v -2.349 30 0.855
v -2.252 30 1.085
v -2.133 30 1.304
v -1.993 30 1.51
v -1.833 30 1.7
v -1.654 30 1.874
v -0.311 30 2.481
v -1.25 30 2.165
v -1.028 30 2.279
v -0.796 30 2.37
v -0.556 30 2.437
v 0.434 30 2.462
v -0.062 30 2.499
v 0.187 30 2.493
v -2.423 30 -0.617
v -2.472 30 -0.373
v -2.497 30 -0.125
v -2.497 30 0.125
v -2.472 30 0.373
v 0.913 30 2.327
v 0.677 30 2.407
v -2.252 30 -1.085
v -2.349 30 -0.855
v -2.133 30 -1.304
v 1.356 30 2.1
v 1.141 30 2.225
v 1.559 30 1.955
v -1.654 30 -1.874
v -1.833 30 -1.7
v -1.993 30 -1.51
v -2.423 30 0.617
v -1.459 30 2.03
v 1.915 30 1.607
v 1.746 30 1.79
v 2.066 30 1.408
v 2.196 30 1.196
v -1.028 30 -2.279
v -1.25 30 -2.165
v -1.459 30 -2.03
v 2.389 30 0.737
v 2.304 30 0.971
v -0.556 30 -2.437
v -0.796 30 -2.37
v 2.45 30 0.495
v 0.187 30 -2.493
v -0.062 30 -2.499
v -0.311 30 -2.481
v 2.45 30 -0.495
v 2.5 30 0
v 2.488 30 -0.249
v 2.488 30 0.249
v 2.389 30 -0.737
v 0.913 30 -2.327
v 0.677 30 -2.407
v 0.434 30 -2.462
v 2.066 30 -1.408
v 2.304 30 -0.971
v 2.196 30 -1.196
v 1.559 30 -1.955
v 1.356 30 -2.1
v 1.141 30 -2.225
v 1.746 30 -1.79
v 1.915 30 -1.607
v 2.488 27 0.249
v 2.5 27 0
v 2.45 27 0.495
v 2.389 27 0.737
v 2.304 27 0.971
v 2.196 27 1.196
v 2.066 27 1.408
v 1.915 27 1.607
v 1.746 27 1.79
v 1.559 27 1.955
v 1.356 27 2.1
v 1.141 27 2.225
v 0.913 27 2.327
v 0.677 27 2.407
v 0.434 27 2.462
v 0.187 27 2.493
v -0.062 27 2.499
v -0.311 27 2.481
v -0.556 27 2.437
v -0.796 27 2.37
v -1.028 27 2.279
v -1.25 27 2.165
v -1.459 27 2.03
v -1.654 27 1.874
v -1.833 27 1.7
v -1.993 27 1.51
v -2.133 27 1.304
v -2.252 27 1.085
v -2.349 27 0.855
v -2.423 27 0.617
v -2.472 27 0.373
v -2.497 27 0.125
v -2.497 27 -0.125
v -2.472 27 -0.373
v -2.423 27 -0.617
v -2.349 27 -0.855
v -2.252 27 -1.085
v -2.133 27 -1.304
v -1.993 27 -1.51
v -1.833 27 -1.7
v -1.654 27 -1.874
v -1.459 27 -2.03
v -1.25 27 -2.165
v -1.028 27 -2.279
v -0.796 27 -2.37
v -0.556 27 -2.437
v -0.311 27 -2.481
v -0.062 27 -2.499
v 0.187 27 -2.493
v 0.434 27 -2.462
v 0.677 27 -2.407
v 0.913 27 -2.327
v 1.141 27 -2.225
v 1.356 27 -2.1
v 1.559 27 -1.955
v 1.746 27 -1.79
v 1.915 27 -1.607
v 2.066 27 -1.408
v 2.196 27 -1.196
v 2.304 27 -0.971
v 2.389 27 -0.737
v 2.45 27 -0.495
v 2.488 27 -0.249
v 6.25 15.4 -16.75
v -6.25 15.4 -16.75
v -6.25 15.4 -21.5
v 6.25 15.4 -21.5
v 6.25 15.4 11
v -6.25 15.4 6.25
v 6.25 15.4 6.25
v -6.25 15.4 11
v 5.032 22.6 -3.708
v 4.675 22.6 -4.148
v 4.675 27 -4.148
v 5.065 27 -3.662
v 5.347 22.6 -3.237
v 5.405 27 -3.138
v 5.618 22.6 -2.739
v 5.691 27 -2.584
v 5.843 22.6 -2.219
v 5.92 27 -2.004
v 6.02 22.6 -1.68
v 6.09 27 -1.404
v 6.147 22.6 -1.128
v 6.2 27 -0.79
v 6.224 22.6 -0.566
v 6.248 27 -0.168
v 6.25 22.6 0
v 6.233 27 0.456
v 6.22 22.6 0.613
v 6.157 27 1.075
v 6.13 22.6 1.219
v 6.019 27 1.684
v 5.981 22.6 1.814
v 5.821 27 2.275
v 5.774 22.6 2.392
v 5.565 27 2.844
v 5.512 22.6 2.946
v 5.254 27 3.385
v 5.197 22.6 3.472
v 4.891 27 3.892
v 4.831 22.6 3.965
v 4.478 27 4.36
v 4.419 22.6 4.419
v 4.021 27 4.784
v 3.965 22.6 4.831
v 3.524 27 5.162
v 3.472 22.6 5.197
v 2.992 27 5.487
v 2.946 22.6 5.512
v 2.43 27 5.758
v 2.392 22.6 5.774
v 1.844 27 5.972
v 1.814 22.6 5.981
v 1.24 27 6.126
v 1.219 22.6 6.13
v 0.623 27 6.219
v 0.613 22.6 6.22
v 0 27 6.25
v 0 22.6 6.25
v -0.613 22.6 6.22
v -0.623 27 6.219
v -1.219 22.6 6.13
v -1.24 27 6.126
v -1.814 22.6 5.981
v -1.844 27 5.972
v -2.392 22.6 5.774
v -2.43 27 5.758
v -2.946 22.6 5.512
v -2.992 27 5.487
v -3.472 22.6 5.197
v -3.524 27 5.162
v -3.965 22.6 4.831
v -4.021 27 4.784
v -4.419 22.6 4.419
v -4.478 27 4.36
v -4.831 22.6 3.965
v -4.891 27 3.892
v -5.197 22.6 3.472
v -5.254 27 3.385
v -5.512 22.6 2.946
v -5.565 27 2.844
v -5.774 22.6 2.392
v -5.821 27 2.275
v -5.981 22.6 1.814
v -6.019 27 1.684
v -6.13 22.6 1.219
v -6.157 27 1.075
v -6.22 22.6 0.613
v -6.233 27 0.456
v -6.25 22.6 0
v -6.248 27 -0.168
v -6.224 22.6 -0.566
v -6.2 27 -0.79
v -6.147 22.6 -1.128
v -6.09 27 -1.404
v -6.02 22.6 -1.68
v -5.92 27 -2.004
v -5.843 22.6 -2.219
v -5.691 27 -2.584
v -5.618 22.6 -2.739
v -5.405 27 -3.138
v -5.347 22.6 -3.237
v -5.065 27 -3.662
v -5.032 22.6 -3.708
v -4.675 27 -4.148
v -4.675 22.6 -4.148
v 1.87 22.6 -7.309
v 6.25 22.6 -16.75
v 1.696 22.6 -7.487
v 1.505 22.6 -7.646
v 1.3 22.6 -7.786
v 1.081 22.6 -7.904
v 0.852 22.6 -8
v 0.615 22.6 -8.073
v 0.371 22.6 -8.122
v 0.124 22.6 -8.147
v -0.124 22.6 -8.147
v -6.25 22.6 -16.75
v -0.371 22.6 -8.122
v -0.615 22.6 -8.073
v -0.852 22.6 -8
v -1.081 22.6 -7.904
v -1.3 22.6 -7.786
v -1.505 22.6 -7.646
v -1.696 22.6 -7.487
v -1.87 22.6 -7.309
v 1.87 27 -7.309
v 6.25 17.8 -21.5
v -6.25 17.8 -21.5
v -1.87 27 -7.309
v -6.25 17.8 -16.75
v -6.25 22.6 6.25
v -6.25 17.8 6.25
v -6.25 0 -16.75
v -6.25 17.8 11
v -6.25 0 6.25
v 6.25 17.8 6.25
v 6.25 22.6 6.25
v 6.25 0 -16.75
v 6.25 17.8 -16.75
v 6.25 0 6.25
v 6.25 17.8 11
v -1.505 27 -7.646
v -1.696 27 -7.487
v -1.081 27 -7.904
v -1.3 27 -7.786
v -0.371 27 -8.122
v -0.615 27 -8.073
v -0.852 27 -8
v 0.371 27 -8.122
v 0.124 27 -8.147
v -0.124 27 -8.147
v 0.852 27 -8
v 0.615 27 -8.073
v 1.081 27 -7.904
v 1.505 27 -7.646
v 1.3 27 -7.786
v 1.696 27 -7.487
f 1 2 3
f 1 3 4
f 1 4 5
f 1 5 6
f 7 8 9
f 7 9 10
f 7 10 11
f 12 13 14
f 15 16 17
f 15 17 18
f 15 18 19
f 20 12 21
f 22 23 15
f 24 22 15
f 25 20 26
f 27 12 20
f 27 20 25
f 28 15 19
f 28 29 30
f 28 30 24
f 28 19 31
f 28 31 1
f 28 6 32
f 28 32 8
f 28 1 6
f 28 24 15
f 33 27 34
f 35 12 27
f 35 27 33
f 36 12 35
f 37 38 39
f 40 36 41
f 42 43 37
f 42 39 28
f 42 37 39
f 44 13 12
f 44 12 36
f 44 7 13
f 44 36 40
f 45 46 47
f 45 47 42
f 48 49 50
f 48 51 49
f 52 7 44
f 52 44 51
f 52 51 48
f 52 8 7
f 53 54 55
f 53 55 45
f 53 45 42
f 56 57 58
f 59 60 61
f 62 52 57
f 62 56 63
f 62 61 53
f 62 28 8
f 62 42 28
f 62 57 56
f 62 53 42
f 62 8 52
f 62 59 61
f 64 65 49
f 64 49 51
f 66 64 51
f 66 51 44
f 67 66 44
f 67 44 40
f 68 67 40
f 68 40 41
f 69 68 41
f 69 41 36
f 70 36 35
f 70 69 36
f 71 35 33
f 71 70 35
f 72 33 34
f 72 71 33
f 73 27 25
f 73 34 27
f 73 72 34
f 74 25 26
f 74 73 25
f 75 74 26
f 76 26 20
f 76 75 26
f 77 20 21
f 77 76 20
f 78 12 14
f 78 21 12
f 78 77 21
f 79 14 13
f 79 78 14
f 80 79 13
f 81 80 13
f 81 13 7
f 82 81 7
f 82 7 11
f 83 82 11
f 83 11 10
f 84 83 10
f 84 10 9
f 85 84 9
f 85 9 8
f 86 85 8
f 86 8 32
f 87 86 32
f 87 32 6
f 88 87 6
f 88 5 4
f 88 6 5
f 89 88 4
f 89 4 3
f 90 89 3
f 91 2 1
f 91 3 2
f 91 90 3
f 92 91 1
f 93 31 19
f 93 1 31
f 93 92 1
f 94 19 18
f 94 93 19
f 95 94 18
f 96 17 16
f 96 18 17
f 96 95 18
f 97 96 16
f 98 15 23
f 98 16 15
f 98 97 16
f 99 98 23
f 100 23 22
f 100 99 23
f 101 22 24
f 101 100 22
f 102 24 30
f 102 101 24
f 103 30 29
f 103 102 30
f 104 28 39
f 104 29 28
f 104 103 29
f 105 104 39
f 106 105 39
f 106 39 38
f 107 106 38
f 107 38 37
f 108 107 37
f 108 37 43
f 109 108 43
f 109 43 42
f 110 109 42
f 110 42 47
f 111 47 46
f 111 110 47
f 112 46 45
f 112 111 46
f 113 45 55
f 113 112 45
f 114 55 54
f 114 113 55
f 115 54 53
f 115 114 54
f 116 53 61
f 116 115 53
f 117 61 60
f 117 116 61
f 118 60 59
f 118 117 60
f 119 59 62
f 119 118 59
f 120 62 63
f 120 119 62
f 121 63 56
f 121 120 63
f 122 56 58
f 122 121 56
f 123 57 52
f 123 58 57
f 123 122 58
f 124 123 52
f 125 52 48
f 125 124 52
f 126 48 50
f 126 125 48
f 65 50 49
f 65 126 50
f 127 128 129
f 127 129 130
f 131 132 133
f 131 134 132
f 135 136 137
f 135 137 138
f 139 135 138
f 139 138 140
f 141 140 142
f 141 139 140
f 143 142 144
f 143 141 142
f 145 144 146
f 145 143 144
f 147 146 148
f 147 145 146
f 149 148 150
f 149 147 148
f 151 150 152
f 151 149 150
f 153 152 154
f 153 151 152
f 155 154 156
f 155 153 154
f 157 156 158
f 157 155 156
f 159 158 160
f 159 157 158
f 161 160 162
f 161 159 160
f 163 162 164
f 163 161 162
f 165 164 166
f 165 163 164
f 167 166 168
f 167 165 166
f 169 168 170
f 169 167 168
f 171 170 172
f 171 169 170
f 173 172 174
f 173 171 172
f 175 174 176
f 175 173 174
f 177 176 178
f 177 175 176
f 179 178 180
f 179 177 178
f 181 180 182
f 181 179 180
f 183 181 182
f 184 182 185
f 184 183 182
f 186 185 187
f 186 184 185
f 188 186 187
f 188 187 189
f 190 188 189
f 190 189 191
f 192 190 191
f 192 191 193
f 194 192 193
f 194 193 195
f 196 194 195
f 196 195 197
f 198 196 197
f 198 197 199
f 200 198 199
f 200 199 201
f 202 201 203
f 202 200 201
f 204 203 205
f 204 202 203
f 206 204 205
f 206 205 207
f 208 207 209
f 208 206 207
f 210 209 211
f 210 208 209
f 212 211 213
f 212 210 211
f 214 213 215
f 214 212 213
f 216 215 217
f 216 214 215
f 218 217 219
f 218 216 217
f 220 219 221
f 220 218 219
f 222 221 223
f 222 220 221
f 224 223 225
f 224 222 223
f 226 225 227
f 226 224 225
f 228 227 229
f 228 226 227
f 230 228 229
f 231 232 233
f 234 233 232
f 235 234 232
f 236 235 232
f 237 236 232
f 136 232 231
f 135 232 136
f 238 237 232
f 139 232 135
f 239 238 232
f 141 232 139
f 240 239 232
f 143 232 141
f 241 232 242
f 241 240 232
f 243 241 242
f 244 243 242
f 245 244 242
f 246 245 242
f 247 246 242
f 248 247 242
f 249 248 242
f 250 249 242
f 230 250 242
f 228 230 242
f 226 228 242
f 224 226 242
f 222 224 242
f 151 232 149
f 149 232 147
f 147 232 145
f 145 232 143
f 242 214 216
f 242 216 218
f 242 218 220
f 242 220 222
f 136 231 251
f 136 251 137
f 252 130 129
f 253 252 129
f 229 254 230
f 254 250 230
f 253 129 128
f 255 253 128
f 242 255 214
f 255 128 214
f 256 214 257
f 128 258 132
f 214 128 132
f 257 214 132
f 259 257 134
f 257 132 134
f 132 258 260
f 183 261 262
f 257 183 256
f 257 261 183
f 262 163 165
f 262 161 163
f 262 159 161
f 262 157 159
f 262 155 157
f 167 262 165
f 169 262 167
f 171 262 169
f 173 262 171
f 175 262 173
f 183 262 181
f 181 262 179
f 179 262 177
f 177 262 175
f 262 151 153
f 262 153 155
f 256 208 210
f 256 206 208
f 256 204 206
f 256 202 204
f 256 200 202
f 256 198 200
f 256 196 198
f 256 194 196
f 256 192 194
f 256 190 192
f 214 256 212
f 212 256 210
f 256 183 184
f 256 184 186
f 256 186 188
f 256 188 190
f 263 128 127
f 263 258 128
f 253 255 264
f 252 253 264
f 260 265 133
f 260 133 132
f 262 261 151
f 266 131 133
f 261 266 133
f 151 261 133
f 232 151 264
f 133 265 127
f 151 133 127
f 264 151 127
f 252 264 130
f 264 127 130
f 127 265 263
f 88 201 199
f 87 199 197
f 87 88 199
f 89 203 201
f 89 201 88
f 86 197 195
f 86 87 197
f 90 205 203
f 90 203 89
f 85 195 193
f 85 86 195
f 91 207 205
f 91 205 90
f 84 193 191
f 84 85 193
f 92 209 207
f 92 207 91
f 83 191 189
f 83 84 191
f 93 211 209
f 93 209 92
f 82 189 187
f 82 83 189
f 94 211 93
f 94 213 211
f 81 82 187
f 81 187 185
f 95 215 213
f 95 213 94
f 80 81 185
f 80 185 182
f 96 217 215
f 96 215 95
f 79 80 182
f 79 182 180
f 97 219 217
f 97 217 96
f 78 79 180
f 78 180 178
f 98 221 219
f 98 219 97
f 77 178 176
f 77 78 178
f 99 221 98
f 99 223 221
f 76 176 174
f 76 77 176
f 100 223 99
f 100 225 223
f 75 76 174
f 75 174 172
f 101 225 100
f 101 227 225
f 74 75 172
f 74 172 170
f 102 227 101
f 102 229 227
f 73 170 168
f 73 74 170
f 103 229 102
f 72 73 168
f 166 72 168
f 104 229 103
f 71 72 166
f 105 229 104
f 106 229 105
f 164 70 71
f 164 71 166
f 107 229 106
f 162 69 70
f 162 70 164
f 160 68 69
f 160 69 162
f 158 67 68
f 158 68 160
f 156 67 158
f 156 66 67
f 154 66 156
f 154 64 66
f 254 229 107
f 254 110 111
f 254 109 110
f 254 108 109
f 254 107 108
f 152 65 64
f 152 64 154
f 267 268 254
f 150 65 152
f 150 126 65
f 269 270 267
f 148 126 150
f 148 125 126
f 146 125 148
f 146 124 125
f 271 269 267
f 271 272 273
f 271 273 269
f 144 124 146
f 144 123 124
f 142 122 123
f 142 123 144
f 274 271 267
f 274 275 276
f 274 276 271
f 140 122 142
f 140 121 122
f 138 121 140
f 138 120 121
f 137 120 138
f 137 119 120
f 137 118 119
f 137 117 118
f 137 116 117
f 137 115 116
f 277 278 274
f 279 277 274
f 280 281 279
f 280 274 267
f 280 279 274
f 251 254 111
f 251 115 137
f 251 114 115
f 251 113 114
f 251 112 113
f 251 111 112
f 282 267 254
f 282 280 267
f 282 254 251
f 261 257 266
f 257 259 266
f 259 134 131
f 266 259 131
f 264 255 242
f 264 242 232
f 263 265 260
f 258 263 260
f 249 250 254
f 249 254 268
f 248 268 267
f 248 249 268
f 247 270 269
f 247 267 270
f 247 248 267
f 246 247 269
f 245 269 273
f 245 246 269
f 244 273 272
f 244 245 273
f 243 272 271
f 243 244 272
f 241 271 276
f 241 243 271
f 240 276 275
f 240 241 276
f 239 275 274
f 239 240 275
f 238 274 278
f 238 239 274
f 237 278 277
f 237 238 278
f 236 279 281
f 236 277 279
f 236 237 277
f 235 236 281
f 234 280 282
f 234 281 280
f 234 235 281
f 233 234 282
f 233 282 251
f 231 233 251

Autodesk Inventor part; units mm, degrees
ref_plane "YZ Plane" through (0, 0, 0) normal (1, 0, 0) x (0, 1, 0)
ref_plane "XZ Plane" through (0, 0, 0) normal (0, 1, 0) x (-1, 0, 0)
sketch "スケッチ1" plane through (0, 0, 0) normal (0, 1, 0) x (-1, 0, 0)
  line L0 (6.25, -16.75) -> (-6.25, -16.75)
  line L1 (-6.25, -16.75) -> (-6.25, 6.25)
  line L2 (-6.25, 6.25) -> (6.25, 6.25)
  line L3 (6.25, 6.25) -> (6.25, -16.75)
  line L4 (6.25, -16.75) -> (-6.25, 6.25) construction
  line L5 (-6.25, -16.75) -> (6.25, 6.25) construction
  point P0 (0, 0)
  point P1 (0, -5.25)
  dimension "d0" = 12.5
  dimension "d1" = 23
  dimension "d2" = 6.25
extrude "押し出し1" add sketch "スケッチ1" along normal blind 22.6
sketch "スケッチ2" plane through (0, 22.6, 0) normal (0, 1, 0) x (1, 0, 0)
  circle A0 centre (0, 0) radius 6.25
  line L0 (-6.25, -6.25) -> (6.25, -6.25) projected
  line L1 (6.25, -6.25) -> (6.25, 16.75) projected
  line L2 (-6.25, 16.75) -> (-6.25, -6.25) projected
  circle A1 centre (0, 5.65) radius 2.5
  line L3 (-1.87, 7.3093) -> (-4.6749, 4.1482)
  line L4 (1.87, 7.3093) -> (4.6749, 4.1482)
  point P0 (0, 0)
  point P1 (-2.4988, 5.7288)
  point P2 (2.4988, 5.7288)
  dimension "d14" = 5
  dimension "d33" = 11.9
extrude "押し出し2" add sketch "スケッチ2" along normal blind 4.4 contours A0 A1 | A0 A1 L4 | A1 A0 | A0 A1 | A0 L3 A1
ref_plane "作業平面1" through (0, 15.4, 0) normal (0, -1, 0) x (1, 0, 0)
sketch "スケッチ3" plane through (0, 15.4, 0) normal (0, -1, 0) x (1, 0, 0)
  line L0 (-6.25, 11) -> (6.25, 11)
  line L1 (6.25, 11) -> (6.25, -21.5)
  line L2 (6.25, -21.5) -> (-6.25, -21.5)
  line L3 (-6.25, -21.5) -> (-6.25, 11)
  line L4 (-6.25, 11) -> (6.25, -21.5) construction
  line L5 (6.25, 11) -> (-6.25, -21.5) construction
  line L6 (-6.25, 0) -> (-6.25, 6.25) projected
  line L7 (6.25, 0) -> (6.25, -16.75) projected
  line L8 (-6.25, -16.75) -> (-6.25, 6.25) projected
  point P0 (0, 0)
  point P1 (0, -5.25)
  point P2 (-6.25, -5.25)
  dimension "d8" = 32.5
extrude "押し出し3" add sketch "スケッチ3" against normal blind 2.4
sketch "スケッチ4" plane through (0, 27, 0) normal (0, 1, 0) x (1, 0, 0)
  circle A0 centre (0, 0) radius 2.5
  point P0 (0, 0)
  dimension "d11" = 5
extrude "押し出し4" add sketch "スケッチ4" along normal blind 3
properties part number "sg90_Tower_Pro"
